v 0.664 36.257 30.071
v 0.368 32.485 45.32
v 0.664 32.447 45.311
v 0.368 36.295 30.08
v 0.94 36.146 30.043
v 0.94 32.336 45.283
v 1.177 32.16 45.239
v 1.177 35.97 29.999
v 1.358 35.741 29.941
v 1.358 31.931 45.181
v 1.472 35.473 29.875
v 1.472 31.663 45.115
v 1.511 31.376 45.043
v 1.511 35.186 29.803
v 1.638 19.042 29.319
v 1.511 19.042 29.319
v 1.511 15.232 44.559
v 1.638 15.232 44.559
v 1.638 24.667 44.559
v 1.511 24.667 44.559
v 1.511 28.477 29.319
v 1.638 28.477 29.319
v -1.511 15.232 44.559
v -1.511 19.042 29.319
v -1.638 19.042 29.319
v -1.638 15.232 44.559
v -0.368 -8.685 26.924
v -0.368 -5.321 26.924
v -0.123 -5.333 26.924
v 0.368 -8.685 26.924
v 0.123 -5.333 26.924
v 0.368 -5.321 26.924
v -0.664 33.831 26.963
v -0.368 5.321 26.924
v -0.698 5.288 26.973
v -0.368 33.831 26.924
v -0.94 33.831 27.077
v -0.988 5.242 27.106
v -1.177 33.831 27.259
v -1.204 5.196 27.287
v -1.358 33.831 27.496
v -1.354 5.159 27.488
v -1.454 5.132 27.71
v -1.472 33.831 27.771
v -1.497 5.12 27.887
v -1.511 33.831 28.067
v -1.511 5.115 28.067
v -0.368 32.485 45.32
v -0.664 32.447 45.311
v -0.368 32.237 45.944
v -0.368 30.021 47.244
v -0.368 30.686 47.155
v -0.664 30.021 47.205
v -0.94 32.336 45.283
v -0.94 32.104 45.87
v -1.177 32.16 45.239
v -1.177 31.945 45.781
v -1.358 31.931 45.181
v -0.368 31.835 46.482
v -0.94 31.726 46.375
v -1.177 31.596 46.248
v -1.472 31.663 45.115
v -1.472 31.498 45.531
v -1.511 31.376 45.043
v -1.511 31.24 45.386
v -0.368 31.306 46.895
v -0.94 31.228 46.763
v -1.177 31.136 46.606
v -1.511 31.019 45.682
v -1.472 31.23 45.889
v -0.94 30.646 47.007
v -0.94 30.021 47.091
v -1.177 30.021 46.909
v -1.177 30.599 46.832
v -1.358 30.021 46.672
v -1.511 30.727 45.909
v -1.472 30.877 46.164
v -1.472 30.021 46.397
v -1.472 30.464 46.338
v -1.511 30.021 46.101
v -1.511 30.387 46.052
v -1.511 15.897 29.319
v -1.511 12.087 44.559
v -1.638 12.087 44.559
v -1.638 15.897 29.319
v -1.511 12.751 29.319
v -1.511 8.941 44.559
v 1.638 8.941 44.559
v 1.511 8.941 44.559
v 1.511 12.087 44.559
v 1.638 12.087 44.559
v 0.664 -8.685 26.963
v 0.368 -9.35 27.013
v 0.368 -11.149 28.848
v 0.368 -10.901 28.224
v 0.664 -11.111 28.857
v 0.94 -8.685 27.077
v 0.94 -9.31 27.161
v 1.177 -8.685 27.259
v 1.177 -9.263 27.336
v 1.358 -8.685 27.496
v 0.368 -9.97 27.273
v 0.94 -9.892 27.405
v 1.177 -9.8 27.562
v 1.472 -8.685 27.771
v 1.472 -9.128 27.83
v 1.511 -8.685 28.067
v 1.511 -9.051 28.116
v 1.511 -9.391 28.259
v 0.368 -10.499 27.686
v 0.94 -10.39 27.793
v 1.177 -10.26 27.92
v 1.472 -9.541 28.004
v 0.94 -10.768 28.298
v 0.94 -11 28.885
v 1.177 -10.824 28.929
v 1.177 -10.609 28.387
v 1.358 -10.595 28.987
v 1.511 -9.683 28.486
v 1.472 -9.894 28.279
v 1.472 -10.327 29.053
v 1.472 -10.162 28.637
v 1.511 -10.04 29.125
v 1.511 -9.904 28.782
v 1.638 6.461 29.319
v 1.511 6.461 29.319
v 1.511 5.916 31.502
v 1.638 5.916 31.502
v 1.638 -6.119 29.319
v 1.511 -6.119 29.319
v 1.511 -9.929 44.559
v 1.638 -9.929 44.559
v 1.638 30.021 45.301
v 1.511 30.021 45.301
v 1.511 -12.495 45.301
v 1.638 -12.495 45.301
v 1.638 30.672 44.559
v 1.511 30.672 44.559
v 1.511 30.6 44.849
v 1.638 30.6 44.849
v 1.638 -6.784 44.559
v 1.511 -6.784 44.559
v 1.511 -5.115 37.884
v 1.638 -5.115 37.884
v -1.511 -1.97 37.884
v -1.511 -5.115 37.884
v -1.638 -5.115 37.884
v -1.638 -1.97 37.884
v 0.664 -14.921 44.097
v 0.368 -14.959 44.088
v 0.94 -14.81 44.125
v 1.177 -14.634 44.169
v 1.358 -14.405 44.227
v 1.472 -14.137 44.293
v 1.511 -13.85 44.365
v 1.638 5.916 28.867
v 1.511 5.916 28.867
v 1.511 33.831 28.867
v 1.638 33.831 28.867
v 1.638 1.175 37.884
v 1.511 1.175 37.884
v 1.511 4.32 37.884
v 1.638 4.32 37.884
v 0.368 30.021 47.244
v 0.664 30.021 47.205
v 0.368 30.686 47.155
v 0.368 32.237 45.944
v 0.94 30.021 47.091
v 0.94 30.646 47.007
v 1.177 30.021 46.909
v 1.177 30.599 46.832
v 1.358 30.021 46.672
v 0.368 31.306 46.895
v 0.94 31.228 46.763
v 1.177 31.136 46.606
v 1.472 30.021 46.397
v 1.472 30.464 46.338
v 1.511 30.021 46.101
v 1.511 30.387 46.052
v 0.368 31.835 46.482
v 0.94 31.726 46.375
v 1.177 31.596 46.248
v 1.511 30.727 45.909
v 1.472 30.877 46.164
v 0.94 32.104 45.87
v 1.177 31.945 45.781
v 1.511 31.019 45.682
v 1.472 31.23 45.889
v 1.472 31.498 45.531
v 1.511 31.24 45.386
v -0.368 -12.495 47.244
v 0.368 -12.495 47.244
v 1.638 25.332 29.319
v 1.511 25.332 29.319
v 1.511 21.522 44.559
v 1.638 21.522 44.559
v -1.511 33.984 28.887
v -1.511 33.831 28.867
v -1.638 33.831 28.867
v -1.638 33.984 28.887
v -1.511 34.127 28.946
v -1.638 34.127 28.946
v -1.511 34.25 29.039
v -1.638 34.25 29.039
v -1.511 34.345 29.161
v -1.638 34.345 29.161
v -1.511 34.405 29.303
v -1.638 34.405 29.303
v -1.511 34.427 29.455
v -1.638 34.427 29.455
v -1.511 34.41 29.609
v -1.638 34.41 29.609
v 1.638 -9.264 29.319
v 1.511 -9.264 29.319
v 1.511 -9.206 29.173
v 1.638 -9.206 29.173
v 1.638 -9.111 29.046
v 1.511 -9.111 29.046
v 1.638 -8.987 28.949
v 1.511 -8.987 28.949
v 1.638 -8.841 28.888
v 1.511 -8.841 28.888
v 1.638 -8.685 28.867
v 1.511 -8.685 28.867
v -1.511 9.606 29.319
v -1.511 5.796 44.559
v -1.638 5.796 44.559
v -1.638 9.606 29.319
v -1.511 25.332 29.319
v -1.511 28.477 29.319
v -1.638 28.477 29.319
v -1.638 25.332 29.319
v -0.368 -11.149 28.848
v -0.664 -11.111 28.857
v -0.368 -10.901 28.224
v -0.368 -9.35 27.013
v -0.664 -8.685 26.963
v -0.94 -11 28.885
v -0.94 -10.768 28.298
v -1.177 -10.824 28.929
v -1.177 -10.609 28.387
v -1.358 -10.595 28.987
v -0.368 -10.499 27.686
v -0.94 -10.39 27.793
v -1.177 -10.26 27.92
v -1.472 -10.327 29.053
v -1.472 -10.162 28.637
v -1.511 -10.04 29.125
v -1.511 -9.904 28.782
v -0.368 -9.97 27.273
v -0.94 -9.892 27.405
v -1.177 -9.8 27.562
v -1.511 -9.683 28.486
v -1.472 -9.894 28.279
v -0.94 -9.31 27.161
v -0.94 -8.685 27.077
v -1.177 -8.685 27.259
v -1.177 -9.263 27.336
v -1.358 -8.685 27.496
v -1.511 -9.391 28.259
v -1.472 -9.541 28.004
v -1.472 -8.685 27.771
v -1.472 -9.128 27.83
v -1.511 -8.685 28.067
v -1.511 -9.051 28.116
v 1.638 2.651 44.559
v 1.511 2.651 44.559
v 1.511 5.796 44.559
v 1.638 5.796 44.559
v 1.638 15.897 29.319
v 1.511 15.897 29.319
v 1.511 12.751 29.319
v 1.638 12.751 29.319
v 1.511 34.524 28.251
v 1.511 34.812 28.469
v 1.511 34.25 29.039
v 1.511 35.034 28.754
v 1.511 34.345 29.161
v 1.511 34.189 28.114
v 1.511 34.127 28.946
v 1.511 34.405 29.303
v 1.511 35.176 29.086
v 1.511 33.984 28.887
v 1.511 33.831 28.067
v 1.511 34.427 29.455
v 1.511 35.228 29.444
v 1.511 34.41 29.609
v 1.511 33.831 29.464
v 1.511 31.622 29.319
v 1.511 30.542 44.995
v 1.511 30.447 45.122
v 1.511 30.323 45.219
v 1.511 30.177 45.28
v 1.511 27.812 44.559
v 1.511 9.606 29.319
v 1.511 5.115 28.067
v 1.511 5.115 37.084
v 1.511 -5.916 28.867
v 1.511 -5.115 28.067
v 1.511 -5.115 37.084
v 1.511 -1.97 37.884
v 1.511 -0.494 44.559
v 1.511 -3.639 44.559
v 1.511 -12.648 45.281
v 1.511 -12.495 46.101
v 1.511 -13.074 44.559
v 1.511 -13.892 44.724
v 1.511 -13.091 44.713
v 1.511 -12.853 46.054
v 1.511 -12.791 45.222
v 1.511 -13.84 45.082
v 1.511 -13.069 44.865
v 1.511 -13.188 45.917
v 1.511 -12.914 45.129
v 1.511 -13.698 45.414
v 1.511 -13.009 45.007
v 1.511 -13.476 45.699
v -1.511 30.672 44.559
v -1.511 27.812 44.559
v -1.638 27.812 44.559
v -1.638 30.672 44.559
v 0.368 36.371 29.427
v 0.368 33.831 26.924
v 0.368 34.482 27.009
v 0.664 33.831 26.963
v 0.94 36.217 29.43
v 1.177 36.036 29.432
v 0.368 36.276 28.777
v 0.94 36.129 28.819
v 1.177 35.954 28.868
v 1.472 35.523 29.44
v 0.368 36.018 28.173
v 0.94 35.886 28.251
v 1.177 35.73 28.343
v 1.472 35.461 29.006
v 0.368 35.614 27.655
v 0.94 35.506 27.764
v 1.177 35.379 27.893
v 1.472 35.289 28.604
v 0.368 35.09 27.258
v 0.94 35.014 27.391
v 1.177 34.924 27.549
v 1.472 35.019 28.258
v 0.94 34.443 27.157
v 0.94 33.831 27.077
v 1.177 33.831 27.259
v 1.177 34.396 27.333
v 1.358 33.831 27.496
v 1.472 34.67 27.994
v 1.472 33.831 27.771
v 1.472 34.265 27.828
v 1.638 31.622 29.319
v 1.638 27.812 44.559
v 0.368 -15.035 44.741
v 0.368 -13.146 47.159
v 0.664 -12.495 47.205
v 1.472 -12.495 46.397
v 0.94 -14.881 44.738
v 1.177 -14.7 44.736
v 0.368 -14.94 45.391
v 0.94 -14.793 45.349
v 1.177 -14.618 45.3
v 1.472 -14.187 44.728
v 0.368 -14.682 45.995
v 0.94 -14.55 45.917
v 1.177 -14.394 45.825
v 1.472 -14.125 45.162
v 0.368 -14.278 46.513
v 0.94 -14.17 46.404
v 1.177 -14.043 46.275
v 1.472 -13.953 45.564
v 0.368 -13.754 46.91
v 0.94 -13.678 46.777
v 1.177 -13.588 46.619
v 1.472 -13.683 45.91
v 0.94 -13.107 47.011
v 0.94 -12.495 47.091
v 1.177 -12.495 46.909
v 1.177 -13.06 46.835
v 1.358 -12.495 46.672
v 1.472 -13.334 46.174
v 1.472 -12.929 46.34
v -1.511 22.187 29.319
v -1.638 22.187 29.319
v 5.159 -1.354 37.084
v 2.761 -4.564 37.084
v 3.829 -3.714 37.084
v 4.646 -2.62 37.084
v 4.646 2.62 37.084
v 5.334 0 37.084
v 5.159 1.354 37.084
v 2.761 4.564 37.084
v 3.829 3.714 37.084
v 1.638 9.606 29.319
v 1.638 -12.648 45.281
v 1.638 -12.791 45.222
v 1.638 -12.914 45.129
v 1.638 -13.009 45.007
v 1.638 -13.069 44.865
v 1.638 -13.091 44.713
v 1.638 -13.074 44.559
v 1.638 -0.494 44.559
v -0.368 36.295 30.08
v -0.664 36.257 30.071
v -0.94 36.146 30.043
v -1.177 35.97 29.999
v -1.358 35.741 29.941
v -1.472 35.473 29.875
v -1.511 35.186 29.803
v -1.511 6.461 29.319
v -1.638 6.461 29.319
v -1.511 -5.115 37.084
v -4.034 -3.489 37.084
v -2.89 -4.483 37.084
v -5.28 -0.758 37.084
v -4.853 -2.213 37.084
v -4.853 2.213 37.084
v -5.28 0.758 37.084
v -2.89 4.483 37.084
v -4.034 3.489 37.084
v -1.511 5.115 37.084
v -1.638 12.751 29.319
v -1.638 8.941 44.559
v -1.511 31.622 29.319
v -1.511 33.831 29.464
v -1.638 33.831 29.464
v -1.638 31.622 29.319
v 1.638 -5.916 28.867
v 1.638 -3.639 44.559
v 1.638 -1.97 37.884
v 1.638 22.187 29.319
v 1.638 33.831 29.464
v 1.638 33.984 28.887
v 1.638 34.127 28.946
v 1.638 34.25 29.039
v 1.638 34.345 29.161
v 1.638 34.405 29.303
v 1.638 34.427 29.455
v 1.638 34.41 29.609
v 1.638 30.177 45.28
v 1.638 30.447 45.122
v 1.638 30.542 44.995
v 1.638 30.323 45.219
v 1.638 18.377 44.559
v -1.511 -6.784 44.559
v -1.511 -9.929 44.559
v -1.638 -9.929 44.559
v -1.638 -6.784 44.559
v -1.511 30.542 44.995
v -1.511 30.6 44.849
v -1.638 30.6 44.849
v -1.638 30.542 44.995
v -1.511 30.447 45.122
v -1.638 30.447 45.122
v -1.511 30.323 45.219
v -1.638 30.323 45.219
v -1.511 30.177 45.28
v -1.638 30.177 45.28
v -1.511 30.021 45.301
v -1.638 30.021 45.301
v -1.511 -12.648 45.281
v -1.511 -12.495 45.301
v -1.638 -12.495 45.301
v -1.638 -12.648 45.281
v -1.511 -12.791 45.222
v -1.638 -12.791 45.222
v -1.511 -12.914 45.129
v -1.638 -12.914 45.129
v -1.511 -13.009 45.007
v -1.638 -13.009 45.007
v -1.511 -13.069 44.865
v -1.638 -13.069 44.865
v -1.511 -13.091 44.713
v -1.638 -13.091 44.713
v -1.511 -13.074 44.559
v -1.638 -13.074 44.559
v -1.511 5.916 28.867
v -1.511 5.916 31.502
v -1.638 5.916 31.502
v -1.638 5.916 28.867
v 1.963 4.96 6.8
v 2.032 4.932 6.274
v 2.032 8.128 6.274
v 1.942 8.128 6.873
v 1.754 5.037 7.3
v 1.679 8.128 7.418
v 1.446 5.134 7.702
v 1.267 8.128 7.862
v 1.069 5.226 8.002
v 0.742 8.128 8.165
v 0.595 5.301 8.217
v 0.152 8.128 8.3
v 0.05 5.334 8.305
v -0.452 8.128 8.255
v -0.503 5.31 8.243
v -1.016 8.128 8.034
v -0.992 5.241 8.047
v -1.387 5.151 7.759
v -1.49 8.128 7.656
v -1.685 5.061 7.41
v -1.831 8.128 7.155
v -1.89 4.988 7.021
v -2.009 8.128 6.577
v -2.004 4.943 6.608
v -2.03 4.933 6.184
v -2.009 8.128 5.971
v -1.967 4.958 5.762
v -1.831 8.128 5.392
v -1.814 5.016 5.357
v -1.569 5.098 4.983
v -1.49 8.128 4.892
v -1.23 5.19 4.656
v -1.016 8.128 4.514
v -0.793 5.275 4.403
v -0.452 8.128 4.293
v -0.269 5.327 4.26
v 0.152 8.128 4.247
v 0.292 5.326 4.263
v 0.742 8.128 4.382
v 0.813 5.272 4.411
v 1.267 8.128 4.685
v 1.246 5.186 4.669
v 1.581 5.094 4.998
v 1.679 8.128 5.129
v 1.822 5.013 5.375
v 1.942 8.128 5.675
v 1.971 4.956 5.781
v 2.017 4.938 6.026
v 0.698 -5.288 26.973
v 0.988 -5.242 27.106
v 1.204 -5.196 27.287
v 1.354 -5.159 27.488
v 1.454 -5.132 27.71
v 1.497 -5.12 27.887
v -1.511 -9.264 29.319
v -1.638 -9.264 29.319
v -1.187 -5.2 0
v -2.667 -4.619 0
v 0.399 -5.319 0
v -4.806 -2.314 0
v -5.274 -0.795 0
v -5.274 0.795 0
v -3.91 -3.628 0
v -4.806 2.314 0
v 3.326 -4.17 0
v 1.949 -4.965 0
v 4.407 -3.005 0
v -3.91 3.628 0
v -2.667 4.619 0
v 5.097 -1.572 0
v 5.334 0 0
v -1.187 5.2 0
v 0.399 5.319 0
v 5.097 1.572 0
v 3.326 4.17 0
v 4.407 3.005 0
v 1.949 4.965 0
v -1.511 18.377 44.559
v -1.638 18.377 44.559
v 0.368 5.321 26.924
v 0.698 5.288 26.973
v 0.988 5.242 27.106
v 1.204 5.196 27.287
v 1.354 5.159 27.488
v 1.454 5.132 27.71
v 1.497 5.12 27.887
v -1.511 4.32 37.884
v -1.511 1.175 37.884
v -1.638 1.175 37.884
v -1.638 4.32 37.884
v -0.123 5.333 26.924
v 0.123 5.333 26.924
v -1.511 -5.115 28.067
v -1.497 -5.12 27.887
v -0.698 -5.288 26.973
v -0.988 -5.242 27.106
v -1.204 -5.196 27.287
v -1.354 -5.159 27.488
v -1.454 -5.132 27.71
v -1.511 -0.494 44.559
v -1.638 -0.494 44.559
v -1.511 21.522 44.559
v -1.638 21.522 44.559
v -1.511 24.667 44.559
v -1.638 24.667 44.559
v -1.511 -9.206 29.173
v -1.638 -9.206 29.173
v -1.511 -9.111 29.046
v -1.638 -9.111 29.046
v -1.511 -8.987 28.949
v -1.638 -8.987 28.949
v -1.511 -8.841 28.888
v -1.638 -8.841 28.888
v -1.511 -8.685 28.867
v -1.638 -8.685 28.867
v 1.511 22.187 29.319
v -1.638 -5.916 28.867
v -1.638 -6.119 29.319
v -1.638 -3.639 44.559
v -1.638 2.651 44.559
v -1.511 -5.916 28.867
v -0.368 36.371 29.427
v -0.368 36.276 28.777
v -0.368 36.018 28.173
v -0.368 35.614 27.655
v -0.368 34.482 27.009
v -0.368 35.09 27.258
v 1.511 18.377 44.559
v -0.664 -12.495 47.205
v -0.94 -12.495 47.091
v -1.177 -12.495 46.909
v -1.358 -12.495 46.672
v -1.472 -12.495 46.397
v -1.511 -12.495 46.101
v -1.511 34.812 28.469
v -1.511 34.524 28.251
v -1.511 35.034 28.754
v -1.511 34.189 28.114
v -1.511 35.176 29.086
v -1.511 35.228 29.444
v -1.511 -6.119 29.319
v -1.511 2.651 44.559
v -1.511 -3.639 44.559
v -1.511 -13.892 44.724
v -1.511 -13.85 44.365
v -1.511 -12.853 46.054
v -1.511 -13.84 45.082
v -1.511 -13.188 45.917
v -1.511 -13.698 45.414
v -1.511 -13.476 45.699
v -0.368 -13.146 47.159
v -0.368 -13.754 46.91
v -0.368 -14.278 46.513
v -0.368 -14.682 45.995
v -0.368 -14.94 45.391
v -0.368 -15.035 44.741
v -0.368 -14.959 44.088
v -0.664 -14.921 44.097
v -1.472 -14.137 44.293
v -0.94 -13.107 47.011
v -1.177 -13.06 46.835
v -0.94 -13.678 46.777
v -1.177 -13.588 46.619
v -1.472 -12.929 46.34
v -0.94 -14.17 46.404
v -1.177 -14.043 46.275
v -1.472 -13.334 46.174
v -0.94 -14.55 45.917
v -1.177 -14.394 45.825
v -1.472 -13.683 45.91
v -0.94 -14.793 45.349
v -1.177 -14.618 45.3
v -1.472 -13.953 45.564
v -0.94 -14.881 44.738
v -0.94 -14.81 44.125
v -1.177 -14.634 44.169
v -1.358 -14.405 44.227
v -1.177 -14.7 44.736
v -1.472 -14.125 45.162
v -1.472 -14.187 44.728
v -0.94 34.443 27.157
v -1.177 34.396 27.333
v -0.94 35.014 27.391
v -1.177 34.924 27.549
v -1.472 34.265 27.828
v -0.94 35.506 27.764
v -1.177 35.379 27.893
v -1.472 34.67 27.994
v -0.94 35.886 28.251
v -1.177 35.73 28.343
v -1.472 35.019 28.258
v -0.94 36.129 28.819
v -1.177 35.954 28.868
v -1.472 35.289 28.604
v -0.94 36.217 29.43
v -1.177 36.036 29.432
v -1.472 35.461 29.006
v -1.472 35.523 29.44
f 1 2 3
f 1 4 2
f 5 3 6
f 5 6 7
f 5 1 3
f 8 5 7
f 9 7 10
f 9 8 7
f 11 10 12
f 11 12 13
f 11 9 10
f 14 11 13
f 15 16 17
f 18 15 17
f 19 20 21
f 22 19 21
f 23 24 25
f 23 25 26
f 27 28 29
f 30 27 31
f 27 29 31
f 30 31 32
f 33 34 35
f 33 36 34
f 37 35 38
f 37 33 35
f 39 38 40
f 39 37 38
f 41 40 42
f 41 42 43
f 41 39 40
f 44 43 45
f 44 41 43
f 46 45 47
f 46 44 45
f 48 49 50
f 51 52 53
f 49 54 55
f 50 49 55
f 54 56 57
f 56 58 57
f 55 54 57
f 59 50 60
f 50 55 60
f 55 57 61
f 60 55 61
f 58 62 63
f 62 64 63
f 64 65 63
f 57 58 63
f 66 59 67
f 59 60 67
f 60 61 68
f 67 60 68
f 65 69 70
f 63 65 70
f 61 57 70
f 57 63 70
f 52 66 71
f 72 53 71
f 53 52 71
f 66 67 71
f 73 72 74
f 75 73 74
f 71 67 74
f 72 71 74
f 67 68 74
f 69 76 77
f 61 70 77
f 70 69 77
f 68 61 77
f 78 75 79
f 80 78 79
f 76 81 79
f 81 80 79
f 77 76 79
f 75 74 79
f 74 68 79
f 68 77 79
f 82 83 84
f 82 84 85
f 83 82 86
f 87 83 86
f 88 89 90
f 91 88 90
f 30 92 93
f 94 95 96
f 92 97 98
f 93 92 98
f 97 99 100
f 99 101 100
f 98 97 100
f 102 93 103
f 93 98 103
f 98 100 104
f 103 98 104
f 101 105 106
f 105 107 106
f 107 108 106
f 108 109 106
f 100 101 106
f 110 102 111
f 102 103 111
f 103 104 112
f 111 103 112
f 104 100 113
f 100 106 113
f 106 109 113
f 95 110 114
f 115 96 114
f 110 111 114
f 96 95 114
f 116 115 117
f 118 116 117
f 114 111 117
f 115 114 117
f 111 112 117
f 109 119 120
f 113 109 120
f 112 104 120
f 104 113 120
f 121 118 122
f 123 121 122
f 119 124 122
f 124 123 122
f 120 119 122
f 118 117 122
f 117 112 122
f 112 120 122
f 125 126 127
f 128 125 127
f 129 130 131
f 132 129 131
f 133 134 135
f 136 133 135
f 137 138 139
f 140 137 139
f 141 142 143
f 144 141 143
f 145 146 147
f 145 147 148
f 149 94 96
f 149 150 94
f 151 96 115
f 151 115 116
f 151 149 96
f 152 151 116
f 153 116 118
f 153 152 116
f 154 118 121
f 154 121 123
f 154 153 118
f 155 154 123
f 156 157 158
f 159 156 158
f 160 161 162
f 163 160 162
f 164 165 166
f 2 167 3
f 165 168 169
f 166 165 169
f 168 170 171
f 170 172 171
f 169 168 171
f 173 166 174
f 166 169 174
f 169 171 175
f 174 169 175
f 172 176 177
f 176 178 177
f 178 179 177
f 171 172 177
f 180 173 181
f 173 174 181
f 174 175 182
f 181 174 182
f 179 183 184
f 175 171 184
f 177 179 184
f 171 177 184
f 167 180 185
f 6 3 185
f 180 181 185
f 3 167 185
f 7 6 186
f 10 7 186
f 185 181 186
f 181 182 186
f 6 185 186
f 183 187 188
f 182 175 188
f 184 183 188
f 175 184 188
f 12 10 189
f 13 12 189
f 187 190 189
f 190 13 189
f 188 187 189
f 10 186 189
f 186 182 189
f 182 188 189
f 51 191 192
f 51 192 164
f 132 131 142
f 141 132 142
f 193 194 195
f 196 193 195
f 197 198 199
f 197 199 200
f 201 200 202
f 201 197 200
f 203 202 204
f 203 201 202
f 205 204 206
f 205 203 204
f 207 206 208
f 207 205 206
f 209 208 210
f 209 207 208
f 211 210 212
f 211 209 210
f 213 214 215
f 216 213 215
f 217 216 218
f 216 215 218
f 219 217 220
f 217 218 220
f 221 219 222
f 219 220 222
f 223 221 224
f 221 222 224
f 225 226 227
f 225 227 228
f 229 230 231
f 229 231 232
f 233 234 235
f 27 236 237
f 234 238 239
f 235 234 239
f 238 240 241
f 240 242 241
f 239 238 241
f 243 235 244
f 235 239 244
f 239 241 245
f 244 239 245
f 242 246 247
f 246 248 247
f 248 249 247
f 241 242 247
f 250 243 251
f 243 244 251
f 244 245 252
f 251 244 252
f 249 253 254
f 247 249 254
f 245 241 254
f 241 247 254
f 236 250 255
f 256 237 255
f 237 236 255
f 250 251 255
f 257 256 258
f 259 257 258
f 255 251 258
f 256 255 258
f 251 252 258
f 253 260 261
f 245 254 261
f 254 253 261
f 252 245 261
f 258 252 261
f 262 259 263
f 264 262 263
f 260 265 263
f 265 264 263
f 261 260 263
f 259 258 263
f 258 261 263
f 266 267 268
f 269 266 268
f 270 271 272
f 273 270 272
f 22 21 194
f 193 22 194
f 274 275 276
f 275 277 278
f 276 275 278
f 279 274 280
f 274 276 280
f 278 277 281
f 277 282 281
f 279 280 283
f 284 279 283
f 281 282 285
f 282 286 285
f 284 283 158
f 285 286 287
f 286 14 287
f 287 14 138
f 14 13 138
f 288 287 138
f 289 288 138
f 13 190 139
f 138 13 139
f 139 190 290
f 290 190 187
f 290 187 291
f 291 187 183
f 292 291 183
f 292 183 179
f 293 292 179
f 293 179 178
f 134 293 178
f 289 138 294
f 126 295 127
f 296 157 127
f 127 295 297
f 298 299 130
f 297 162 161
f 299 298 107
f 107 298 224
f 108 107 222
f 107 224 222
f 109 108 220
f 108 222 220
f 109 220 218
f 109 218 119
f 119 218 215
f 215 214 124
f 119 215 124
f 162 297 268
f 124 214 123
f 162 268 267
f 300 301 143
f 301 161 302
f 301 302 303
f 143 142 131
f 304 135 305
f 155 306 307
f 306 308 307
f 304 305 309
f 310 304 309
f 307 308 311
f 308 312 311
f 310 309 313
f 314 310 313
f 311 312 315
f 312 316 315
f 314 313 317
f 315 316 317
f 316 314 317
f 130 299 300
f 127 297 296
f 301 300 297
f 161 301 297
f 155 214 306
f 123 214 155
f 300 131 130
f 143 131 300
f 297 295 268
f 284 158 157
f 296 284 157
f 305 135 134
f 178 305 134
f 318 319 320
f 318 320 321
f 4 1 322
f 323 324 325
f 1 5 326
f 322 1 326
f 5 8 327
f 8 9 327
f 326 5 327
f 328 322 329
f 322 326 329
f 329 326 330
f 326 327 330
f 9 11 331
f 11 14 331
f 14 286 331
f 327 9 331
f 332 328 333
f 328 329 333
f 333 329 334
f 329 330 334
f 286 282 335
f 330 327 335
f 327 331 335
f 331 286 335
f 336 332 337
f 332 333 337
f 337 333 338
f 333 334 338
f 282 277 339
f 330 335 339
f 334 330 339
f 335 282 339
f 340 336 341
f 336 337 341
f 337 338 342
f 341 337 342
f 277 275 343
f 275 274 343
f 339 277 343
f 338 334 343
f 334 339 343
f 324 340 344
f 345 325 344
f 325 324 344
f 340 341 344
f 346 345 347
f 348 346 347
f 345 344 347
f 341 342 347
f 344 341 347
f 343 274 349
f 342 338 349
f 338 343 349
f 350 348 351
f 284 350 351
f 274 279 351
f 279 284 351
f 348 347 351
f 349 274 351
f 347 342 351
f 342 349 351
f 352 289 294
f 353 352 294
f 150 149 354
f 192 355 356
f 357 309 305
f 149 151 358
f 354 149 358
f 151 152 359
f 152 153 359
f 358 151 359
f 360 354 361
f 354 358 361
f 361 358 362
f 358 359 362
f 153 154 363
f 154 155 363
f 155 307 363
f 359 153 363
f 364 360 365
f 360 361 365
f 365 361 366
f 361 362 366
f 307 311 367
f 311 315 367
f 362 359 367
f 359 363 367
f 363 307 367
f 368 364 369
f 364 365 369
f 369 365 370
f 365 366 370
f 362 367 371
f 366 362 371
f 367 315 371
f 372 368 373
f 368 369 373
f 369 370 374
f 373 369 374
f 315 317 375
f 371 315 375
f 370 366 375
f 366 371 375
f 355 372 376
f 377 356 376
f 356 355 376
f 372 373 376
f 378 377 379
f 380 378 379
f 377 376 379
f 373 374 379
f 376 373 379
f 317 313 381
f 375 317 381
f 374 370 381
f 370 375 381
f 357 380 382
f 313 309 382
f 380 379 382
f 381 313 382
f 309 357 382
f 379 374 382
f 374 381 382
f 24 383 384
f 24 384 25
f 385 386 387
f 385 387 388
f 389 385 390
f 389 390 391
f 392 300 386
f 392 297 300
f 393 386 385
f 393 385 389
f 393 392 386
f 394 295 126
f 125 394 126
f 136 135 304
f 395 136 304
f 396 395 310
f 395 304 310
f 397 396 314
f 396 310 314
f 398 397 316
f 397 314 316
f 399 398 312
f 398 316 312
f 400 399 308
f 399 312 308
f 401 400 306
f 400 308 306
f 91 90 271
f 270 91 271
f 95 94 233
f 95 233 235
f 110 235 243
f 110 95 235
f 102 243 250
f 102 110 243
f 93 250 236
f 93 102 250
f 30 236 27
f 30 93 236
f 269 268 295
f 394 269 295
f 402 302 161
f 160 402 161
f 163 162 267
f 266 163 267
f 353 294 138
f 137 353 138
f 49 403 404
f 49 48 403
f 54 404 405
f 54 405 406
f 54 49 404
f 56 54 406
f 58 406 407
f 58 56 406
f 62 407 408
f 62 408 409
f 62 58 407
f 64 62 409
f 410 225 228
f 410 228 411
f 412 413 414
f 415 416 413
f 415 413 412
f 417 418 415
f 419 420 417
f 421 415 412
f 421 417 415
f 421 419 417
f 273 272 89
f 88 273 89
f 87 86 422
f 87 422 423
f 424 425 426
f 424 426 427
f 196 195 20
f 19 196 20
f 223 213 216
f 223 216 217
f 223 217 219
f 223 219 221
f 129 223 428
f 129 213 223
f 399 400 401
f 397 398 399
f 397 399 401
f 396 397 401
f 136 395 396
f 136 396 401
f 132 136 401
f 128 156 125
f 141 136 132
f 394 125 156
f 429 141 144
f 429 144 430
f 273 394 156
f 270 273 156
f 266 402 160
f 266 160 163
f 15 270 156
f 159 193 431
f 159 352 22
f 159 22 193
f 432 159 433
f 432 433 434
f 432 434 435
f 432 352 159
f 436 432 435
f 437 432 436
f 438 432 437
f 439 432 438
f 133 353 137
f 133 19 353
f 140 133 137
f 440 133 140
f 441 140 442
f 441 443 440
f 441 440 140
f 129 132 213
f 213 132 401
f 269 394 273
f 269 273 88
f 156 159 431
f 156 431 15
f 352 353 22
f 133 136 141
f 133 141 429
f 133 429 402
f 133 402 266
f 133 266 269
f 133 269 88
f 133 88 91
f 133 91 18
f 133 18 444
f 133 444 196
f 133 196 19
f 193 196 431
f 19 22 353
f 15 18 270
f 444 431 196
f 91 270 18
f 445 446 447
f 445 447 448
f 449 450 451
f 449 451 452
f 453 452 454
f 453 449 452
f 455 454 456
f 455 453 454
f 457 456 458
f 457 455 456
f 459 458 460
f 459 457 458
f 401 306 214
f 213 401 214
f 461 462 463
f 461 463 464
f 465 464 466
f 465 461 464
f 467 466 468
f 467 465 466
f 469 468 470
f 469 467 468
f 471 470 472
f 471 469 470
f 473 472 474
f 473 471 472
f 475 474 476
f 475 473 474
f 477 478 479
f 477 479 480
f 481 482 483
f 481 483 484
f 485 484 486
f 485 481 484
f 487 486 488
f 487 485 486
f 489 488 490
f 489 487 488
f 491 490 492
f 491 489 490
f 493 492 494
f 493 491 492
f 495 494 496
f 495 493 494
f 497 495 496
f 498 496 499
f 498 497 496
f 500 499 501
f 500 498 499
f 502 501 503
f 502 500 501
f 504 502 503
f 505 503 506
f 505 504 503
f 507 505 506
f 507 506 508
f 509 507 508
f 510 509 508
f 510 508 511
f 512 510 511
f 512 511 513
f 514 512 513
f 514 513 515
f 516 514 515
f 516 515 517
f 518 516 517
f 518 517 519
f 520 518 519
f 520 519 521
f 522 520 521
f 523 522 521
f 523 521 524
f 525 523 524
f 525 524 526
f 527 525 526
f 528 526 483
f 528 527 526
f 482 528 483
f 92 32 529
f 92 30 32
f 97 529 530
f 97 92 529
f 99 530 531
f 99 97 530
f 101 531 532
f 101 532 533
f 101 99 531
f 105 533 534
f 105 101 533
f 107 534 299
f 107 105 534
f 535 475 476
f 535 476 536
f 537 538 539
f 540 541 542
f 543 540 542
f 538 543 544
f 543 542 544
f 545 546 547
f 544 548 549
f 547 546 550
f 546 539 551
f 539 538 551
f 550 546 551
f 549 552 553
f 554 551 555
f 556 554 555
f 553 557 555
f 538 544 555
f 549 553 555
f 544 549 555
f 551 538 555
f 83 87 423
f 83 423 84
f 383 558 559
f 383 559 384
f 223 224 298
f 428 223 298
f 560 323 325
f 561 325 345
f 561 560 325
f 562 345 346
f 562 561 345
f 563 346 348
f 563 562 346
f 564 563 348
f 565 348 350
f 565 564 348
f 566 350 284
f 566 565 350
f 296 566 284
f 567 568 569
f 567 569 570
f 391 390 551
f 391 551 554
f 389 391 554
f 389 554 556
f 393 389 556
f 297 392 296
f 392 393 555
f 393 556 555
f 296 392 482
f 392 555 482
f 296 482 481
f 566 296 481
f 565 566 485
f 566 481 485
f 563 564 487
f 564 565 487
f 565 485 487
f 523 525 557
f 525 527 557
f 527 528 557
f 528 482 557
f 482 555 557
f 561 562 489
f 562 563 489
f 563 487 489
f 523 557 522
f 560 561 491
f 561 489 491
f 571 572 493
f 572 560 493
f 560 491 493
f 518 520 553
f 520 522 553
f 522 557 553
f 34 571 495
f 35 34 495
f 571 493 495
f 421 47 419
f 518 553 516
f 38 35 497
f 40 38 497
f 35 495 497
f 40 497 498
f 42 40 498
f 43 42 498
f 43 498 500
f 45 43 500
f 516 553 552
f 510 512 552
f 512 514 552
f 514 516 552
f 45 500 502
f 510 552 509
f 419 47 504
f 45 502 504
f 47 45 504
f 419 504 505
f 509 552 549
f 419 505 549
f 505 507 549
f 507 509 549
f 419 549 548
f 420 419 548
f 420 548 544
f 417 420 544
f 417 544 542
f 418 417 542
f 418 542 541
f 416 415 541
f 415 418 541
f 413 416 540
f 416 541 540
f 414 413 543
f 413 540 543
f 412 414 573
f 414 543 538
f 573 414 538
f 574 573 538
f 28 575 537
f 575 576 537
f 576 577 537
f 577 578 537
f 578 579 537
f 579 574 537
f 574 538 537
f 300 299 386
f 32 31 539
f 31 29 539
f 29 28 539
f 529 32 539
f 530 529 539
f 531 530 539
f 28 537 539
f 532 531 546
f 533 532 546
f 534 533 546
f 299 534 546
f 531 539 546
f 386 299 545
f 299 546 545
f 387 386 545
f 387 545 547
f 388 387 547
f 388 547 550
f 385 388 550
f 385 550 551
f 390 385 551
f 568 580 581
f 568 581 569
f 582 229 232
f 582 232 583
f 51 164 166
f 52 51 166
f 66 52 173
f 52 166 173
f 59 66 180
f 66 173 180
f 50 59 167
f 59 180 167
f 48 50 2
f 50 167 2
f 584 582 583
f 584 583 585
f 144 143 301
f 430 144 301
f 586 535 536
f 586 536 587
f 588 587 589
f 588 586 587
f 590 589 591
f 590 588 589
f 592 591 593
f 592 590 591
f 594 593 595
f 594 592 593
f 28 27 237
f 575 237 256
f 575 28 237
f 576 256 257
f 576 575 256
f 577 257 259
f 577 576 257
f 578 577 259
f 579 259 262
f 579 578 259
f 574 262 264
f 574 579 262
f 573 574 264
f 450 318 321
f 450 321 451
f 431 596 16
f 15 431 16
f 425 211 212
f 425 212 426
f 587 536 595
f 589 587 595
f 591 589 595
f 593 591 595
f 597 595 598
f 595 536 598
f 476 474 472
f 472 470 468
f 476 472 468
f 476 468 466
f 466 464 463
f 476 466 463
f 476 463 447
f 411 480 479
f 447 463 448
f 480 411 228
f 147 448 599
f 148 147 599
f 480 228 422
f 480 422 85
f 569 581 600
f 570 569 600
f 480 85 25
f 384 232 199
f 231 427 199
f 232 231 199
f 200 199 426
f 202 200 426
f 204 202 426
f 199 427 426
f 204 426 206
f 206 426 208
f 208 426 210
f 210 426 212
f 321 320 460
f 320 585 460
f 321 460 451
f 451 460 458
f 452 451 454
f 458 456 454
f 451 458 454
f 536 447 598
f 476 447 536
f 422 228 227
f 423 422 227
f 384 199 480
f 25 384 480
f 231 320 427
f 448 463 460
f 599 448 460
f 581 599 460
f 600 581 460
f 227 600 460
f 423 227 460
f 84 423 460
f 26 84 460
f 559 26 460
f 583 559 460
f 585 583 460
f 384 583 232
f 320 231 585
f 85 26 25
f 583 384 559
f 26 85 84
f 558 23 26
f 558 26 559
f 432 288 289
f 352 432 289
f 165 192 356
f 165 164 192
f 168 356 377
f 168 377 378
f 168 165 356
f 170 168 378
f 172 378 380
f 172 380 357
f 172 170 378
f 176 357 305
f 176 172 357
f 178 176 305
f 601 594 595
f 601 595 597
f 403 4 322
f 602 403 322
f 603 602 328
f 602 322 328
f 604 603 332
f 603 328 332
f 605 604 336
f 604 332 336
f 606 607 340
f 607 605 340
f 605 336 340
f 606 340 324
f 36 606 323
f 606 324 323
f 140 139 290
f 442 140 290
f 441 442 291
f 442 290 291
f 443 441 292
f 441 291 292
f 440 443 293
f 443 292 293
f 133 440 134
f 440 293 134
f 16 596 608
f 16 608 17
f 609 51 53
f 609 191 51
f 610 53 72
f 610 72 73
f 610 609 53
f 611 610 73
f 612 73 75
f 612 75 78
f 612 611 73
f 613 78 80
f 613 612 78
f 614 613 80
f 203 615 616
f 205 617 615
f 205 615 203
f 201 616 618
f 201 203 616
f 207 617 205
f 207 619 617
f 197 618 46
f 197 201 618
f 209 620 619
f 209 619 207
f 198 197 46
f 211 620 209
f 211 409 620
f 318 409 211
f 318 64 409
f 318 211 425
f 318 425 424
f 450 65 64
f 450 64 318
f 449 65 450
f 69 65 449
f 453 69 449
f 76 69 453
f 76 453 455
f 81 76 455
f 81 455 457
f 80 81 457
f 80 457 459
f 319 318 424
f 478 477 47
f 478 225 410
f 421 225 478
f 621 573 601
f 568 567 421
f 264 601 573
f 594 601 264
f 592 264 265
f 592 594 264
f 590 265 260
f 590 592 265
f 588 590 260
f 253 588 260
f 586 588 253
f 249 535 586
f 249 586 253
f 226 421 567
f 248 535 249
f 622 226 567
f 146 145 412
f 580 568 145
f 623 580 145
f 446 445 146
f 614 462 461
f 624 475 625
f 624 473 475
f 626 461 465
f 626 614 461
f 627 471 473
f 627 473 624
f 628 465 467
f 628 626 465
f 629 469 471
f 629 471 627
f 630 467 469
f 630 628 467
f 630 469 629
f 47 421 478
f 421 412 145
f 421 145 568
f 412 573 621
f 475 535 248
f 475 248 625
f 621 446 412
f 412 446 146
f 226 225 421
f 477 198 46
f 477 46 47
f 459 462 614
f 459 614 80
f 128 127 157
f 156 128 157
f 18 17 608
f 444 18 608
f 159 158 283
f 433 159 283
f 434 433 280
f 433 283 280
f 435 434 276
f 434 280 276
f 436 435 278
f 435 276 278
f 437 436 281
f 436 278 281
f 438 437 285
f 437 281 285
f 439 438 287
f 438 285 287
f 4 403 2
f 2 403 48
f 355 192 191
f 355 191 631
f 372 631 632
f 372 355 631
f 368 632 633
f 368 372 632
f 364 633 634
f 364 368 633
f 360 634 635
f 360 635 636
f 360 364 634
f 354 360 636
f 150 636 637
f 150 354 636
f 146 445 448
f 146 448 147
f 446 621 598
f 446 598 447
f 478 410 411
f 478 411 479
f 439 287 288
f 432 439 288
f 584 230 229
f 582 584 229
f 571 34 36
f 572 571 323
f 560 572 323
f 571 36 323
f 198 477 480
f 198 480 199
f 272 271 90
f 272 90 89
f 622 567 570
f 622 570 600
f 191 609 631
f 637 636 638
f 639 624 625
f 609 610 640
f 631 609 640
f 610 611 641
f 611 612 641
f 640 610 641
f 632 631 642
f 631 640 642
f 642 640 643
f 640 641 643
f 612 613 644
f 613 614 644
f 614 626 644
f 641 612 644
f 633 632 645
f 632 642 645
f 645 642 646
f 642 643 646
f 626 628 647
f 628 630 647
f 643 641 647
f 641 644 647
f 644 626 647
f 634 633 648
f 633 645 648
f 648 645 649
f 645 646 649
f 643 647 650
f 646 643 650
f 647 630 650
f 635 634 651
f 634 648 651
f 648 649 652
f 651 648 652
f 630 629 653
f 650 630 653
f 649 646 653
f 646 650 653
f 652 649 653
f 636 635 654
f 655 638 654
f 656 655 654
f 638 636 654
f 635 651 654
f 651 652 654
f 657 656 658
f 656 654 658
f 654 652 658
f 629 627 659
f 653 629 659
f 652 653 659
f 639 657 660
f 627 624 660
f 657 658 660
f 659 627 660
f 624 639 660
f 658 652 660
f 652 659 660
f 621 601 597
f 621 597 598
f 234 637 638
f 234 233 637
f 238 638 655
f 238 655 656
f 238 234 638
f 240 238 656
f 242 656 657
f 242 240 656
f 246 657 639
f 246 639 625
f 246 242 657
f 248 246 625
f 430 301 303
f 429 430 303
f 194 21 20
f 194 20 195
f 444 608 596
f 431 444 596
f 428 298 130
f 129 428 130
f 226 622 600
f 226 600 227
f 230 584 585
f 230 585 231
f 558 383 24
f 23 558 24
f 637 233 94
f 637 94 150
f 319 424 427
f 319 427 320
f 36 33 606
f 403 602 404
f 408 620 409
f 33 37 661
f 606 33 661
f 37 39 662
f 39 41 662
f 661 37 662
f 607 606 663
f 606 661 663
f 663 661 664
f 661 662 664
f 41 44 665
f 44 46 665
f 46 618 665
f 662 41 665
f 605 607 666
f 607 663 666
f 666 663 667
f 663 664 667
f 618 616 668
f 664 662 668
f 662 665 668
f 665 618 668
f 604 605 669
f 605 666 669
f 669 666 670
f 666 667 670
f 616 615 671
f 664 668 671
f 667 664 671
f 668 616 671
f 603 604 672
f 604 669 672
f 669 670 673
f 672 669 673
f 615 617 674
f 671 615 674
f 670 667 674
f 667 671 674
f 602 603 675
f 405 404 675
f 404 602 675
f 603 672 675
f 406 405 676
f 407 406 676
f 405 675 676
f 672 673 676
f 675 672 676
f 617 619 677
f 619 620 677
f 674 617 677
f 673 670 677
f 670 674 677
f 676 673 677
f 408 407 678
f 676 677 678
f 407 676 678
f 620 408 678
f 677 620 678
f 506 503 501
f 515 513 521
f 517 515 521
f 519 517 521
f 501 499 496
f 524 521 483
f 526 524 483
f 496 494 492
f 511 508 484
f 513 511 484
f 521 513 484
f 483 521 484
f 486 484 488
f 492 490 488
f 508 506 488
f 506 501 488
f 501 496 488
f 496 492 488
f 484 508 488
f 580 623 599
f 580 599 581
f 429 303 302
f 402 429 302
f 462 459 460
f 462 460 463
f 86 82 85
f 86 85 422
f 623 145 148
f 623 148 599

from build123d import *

# Parameters (mm, degrees)
F0_R      = 5.334
F1_DEPTH  = 37.084
F2_R      = 2.032
F3_DEPTH  = 8.128
F4_W      = 3.0226
F4_H      = 47.752
F5_DEPTH  = 10.16
F7_DEPTH  = 3.0226
F9_DEPTH  = 3.0226
F10_R     = 2.54
F11_R     = 1.143
F13_DEPTH = 0.127


# Not quite as in the source:
# - a feature of the source that left no trace in its solid (it failed there, or was rolled back) is left out


with BuildPart() as f1:
    # F0 (on Top) → F1 (new body)
    with BuildSketch(Plane.XY):
        Circle(F0_R)
    extrude(amount=F1_DEPTH)

    # F2 (on Front) → F3 (join)
    with BuildSketch(Plane.XZ):
        with Locations((0, 6.2738)):
            Circle(F2_R)
    extrude(amount=-F3_DEPTH)

    # F4 (on face) → F5 (join, symmetric)
    with BuildSketch(Plane.XY.offset(37.084)):
        with Locations((0, 13.208)):
            Rectangle(F4_W, F4_H)
    extrude(amount=F5_DEPTH, both=True)

    # F6 (on face) → F7 (join)
    with BuildSketch(Plane(origin=(-1.5113, 0, 0), x_dir=(0, -1, 0), z_dir=(-1, 0, 0))):
        Polygon((15.748, 47.244), (10.668, 47.244), (10.668, 26.924), align=None)
        Polygon((-37.084, 47.244), (-37.084, 26.924), (-32.004, 47.244), align=None)
    extrude(amount=-F7_DEPTH)

    # F8 (on face) → F9 (cut, through all)
    with BuildSketch(Plane(origin=(-1.5113, 0, 0), x_dir=(0, -1, 0), z_dir=(-1, 0, 0))):
        Polygon((-37.084, 47.244), (-37.084, 26.924), (-32.004, 47.244), align=None)
    extrude(amount=-F9_DEPTH, mode=Mode.SUBTRACT)

    # F10
    f10_edges = [f1.edges().sort_by_distance(p)[0] for p in [
        (0, 32.004, 47.244),
        (0, 37.084, 26.924),
        (0, -15.748, 47.244),
        (0, -10.668, 26.924),
    ]]
    fillet(f10_edges, radius=F10_R)

    # F11
    f11_edges = [f1.edges().sort_by_distance(p)[0] for p in [
        (-1.5113, 8.763, 47.244),
        (1.5113, 8.763, 47.244),
        (-1.5113, 34.38999, 37.70004),
        (1.5113, 34.38999, 37.70004),
        (1.5113, 31.583975, 46.706042),
        (-1.5113, 31.583975, 46.706042),
        (-1.5113, 35.83287, 27.900853),
        (1.5113, 35.83287, 27.900853),
        (1.5113, 19.473124, 26.924),
        (-1.5113, 19.473124, 26.924),
        (1.5113, -14.49687, 46.267147),
        (1.5113, -13.05399, 36.46796),
        (-1.5113, -14.49687, 46.267147),
        (-1.5113, -13.05399, 36.46796),
        (1.5113, -10.247975, 27.461958),
        (1.5113, -6.900124, 26.924),
        (-1.5113, -6.900124, 26.924),
        (-1.5113, -10.247975, 27.461958),
    ]]
    fillet(f11_edges, radius=F11_R)

    # F12 (on face) → F13 (join)
    with BuildSketch(Plane.YZ.offset(1.5113)):
        with BuildLine():
            Line((-6.1186332318, 29.319293674), (-9.2636532318, 29.319293674))
            ThreePointArc((-9.2636532318, 29.319293674), (-9.0520071402, 28.9937255277), (-8.6848279277, 28.8673605332))
            Line((-8.6848279277, 28.8673605332), (-5.9157811718, 28.8673605332))
            Line((-5.9157811718, 28.8673605332), (-6.1186332318, 29.319293674))
        make_face()
        Polygon((-9.9286332318, 44.559293674), (-13.0736532318, 44.559293674), (-9.2636532318, 29.319293674), (-6.1186332318, 29.319293674), align=None)
        Polygon((-3.6385932318, 44.559293674), (-6.7836132318, 44.559293674), (-5.1148799466, 37.8843605332), (-1.9698599466, 37.8843605332), align=None)
        Polygon((2.6514467682, 44.559293674), (-0.4935732318, 44.559293674), (1.1751600534, 37.8843605332), (4.3201800534, 37.8843605332), align=None)
        with BuildLine():
            ThreePointArc((33.8308279277, 28.8673605332), (34.3011024, 29.0968207875), (34.4096532318, 29.608706326))
            Line((34.4096532318, 29.608706326), (33.8308279277, 29.464))
            Line((33.8308279277, 29.464), (31.6216067682, 29.319293674))
            Line((31.6216067682, 29.319293674), (28.4765867682, 29.319293674))
            Line((28.4765867682, 29.319293674), (25.3315667682, 29.319293674))
            Line((25.3315667682, 29.319293674), (22.1865467682, 29.319293674))
            Line((22.1865467682, 29.319293674), (19.0415267682, 29.319293674))
            Line((19.0415267682, 29.319293674), (15.8965067682, 29.319293674))
            Line((15.8965067682, 29.319293674), (12.7514867682, 29.319293674))
            Line((12.7514867682, 29.319293674), (9.6064667682, 29.319293674))
            Line((9.6064667682, 29.319293674), (6.4614467682, 29.319293674))
            Line((6.4614467682, 29.319293674), (5.9157811718, 31.5019560598))
            Line((5.9157811718, 31.5019560598), (5.9157811718, 28.8673605332))
            Line((5.9157811718, 28.8673605332), (33.8308279277, 28.8673605332))
        make_face()
        with BuildLine():
            ThreePointArc((-12.4948279277, 45.3006394668), (-12.9651024, 45.0711792125), (-13.0736532318, 44.559293674))
            Line((-13.0736532318, 44.559293674), (-9.9286332318, 44.559293674))
            Line((-9.9286332318, 44.559293674), (-6.7836132318, 44.559293674))
            Line((-6.7836132318, 44.559293674), (-3.6385932318, 44.559293674))
            Line((-3.6385932318, 44.559293674), (-0.4935732318, 44.559293674))
            Line((-0.4935732318, 44.559293674), (2.6514467682, 44.559293674))
            Line((2.6514467682, 44.559293674), (5.7964667682, 44.559293674))
            Line((5.7964667682, 44.559293674), (8.9414867682, 44.559293674))
            Line((8.9414867682, 44.559293674), (12.0865067682, 44.559293674))
            Line((12.0865067682, 44.559293674), (15.2315267682, 44.559293674))
            Line((15.2315267682, 44.559293674), (18.3765467682, 44.559293674))
            Line((18.3765467682, 44.559293674), (21.5215667682, 44.559293674))
            Line((21.5215667682, 44.559293674), (24.6665867682, 44.559293674))
            Line((24.6665867682, 44.559293674), (27.8116067682, 44.559293674))
            Line((27.8116067682, 44.559293674), (30.6720063948, 44.559293674))
            Line((30.6720063948, 44.559293674), (30.5996532318, 44.848706326))
            ThreePointArc((30.5996532318, 44.848706326), (30.3880071402, 45.1742744723), (30.0208279277, 45.3006394668))
            Line((30.0208279277, 45.3006394668), (-12.4948279277, 45.3006394668))
        make_face()
        Polygon((8.9414867682, 44.559293674), (5.7964667682, 44.559293674), (9.6064667682, 29.319293674), (12.7514867682, 29.319293674), align=None)
        Polygon((15.2315267682, 44.559293674), (12.0865067682, 44.559293674), (15.8965067682, 29.319293674), (19.0415267682, 29.319293674), align=None)
        Polygon((25.3315667682, 29.319293674), (21.5215667682, 44.559293674), (18.3765467682, 44.559293674), (22.1865467682, 29.319293674), align=None)
        Polygon((31.6216067682, 29.319293674), (27.8116067682, 44.559293674), (24.6665867682, 44.559293674), (28.4765867682, 29.319293674), align=None)
    extrude(amount=F13_DEPTH)

    # F14: F1 across plane


with BuildPart() as f1_1:
    add(f1.part)
    add(f1.part.mirror(Plane.YZ))

    # F17: F1 across plane


with BuildPart() as f1_2:
    add(f1_1.part)
    add(f1_1.part.mirror(Plane.YZ))


solid = f1_2.part
